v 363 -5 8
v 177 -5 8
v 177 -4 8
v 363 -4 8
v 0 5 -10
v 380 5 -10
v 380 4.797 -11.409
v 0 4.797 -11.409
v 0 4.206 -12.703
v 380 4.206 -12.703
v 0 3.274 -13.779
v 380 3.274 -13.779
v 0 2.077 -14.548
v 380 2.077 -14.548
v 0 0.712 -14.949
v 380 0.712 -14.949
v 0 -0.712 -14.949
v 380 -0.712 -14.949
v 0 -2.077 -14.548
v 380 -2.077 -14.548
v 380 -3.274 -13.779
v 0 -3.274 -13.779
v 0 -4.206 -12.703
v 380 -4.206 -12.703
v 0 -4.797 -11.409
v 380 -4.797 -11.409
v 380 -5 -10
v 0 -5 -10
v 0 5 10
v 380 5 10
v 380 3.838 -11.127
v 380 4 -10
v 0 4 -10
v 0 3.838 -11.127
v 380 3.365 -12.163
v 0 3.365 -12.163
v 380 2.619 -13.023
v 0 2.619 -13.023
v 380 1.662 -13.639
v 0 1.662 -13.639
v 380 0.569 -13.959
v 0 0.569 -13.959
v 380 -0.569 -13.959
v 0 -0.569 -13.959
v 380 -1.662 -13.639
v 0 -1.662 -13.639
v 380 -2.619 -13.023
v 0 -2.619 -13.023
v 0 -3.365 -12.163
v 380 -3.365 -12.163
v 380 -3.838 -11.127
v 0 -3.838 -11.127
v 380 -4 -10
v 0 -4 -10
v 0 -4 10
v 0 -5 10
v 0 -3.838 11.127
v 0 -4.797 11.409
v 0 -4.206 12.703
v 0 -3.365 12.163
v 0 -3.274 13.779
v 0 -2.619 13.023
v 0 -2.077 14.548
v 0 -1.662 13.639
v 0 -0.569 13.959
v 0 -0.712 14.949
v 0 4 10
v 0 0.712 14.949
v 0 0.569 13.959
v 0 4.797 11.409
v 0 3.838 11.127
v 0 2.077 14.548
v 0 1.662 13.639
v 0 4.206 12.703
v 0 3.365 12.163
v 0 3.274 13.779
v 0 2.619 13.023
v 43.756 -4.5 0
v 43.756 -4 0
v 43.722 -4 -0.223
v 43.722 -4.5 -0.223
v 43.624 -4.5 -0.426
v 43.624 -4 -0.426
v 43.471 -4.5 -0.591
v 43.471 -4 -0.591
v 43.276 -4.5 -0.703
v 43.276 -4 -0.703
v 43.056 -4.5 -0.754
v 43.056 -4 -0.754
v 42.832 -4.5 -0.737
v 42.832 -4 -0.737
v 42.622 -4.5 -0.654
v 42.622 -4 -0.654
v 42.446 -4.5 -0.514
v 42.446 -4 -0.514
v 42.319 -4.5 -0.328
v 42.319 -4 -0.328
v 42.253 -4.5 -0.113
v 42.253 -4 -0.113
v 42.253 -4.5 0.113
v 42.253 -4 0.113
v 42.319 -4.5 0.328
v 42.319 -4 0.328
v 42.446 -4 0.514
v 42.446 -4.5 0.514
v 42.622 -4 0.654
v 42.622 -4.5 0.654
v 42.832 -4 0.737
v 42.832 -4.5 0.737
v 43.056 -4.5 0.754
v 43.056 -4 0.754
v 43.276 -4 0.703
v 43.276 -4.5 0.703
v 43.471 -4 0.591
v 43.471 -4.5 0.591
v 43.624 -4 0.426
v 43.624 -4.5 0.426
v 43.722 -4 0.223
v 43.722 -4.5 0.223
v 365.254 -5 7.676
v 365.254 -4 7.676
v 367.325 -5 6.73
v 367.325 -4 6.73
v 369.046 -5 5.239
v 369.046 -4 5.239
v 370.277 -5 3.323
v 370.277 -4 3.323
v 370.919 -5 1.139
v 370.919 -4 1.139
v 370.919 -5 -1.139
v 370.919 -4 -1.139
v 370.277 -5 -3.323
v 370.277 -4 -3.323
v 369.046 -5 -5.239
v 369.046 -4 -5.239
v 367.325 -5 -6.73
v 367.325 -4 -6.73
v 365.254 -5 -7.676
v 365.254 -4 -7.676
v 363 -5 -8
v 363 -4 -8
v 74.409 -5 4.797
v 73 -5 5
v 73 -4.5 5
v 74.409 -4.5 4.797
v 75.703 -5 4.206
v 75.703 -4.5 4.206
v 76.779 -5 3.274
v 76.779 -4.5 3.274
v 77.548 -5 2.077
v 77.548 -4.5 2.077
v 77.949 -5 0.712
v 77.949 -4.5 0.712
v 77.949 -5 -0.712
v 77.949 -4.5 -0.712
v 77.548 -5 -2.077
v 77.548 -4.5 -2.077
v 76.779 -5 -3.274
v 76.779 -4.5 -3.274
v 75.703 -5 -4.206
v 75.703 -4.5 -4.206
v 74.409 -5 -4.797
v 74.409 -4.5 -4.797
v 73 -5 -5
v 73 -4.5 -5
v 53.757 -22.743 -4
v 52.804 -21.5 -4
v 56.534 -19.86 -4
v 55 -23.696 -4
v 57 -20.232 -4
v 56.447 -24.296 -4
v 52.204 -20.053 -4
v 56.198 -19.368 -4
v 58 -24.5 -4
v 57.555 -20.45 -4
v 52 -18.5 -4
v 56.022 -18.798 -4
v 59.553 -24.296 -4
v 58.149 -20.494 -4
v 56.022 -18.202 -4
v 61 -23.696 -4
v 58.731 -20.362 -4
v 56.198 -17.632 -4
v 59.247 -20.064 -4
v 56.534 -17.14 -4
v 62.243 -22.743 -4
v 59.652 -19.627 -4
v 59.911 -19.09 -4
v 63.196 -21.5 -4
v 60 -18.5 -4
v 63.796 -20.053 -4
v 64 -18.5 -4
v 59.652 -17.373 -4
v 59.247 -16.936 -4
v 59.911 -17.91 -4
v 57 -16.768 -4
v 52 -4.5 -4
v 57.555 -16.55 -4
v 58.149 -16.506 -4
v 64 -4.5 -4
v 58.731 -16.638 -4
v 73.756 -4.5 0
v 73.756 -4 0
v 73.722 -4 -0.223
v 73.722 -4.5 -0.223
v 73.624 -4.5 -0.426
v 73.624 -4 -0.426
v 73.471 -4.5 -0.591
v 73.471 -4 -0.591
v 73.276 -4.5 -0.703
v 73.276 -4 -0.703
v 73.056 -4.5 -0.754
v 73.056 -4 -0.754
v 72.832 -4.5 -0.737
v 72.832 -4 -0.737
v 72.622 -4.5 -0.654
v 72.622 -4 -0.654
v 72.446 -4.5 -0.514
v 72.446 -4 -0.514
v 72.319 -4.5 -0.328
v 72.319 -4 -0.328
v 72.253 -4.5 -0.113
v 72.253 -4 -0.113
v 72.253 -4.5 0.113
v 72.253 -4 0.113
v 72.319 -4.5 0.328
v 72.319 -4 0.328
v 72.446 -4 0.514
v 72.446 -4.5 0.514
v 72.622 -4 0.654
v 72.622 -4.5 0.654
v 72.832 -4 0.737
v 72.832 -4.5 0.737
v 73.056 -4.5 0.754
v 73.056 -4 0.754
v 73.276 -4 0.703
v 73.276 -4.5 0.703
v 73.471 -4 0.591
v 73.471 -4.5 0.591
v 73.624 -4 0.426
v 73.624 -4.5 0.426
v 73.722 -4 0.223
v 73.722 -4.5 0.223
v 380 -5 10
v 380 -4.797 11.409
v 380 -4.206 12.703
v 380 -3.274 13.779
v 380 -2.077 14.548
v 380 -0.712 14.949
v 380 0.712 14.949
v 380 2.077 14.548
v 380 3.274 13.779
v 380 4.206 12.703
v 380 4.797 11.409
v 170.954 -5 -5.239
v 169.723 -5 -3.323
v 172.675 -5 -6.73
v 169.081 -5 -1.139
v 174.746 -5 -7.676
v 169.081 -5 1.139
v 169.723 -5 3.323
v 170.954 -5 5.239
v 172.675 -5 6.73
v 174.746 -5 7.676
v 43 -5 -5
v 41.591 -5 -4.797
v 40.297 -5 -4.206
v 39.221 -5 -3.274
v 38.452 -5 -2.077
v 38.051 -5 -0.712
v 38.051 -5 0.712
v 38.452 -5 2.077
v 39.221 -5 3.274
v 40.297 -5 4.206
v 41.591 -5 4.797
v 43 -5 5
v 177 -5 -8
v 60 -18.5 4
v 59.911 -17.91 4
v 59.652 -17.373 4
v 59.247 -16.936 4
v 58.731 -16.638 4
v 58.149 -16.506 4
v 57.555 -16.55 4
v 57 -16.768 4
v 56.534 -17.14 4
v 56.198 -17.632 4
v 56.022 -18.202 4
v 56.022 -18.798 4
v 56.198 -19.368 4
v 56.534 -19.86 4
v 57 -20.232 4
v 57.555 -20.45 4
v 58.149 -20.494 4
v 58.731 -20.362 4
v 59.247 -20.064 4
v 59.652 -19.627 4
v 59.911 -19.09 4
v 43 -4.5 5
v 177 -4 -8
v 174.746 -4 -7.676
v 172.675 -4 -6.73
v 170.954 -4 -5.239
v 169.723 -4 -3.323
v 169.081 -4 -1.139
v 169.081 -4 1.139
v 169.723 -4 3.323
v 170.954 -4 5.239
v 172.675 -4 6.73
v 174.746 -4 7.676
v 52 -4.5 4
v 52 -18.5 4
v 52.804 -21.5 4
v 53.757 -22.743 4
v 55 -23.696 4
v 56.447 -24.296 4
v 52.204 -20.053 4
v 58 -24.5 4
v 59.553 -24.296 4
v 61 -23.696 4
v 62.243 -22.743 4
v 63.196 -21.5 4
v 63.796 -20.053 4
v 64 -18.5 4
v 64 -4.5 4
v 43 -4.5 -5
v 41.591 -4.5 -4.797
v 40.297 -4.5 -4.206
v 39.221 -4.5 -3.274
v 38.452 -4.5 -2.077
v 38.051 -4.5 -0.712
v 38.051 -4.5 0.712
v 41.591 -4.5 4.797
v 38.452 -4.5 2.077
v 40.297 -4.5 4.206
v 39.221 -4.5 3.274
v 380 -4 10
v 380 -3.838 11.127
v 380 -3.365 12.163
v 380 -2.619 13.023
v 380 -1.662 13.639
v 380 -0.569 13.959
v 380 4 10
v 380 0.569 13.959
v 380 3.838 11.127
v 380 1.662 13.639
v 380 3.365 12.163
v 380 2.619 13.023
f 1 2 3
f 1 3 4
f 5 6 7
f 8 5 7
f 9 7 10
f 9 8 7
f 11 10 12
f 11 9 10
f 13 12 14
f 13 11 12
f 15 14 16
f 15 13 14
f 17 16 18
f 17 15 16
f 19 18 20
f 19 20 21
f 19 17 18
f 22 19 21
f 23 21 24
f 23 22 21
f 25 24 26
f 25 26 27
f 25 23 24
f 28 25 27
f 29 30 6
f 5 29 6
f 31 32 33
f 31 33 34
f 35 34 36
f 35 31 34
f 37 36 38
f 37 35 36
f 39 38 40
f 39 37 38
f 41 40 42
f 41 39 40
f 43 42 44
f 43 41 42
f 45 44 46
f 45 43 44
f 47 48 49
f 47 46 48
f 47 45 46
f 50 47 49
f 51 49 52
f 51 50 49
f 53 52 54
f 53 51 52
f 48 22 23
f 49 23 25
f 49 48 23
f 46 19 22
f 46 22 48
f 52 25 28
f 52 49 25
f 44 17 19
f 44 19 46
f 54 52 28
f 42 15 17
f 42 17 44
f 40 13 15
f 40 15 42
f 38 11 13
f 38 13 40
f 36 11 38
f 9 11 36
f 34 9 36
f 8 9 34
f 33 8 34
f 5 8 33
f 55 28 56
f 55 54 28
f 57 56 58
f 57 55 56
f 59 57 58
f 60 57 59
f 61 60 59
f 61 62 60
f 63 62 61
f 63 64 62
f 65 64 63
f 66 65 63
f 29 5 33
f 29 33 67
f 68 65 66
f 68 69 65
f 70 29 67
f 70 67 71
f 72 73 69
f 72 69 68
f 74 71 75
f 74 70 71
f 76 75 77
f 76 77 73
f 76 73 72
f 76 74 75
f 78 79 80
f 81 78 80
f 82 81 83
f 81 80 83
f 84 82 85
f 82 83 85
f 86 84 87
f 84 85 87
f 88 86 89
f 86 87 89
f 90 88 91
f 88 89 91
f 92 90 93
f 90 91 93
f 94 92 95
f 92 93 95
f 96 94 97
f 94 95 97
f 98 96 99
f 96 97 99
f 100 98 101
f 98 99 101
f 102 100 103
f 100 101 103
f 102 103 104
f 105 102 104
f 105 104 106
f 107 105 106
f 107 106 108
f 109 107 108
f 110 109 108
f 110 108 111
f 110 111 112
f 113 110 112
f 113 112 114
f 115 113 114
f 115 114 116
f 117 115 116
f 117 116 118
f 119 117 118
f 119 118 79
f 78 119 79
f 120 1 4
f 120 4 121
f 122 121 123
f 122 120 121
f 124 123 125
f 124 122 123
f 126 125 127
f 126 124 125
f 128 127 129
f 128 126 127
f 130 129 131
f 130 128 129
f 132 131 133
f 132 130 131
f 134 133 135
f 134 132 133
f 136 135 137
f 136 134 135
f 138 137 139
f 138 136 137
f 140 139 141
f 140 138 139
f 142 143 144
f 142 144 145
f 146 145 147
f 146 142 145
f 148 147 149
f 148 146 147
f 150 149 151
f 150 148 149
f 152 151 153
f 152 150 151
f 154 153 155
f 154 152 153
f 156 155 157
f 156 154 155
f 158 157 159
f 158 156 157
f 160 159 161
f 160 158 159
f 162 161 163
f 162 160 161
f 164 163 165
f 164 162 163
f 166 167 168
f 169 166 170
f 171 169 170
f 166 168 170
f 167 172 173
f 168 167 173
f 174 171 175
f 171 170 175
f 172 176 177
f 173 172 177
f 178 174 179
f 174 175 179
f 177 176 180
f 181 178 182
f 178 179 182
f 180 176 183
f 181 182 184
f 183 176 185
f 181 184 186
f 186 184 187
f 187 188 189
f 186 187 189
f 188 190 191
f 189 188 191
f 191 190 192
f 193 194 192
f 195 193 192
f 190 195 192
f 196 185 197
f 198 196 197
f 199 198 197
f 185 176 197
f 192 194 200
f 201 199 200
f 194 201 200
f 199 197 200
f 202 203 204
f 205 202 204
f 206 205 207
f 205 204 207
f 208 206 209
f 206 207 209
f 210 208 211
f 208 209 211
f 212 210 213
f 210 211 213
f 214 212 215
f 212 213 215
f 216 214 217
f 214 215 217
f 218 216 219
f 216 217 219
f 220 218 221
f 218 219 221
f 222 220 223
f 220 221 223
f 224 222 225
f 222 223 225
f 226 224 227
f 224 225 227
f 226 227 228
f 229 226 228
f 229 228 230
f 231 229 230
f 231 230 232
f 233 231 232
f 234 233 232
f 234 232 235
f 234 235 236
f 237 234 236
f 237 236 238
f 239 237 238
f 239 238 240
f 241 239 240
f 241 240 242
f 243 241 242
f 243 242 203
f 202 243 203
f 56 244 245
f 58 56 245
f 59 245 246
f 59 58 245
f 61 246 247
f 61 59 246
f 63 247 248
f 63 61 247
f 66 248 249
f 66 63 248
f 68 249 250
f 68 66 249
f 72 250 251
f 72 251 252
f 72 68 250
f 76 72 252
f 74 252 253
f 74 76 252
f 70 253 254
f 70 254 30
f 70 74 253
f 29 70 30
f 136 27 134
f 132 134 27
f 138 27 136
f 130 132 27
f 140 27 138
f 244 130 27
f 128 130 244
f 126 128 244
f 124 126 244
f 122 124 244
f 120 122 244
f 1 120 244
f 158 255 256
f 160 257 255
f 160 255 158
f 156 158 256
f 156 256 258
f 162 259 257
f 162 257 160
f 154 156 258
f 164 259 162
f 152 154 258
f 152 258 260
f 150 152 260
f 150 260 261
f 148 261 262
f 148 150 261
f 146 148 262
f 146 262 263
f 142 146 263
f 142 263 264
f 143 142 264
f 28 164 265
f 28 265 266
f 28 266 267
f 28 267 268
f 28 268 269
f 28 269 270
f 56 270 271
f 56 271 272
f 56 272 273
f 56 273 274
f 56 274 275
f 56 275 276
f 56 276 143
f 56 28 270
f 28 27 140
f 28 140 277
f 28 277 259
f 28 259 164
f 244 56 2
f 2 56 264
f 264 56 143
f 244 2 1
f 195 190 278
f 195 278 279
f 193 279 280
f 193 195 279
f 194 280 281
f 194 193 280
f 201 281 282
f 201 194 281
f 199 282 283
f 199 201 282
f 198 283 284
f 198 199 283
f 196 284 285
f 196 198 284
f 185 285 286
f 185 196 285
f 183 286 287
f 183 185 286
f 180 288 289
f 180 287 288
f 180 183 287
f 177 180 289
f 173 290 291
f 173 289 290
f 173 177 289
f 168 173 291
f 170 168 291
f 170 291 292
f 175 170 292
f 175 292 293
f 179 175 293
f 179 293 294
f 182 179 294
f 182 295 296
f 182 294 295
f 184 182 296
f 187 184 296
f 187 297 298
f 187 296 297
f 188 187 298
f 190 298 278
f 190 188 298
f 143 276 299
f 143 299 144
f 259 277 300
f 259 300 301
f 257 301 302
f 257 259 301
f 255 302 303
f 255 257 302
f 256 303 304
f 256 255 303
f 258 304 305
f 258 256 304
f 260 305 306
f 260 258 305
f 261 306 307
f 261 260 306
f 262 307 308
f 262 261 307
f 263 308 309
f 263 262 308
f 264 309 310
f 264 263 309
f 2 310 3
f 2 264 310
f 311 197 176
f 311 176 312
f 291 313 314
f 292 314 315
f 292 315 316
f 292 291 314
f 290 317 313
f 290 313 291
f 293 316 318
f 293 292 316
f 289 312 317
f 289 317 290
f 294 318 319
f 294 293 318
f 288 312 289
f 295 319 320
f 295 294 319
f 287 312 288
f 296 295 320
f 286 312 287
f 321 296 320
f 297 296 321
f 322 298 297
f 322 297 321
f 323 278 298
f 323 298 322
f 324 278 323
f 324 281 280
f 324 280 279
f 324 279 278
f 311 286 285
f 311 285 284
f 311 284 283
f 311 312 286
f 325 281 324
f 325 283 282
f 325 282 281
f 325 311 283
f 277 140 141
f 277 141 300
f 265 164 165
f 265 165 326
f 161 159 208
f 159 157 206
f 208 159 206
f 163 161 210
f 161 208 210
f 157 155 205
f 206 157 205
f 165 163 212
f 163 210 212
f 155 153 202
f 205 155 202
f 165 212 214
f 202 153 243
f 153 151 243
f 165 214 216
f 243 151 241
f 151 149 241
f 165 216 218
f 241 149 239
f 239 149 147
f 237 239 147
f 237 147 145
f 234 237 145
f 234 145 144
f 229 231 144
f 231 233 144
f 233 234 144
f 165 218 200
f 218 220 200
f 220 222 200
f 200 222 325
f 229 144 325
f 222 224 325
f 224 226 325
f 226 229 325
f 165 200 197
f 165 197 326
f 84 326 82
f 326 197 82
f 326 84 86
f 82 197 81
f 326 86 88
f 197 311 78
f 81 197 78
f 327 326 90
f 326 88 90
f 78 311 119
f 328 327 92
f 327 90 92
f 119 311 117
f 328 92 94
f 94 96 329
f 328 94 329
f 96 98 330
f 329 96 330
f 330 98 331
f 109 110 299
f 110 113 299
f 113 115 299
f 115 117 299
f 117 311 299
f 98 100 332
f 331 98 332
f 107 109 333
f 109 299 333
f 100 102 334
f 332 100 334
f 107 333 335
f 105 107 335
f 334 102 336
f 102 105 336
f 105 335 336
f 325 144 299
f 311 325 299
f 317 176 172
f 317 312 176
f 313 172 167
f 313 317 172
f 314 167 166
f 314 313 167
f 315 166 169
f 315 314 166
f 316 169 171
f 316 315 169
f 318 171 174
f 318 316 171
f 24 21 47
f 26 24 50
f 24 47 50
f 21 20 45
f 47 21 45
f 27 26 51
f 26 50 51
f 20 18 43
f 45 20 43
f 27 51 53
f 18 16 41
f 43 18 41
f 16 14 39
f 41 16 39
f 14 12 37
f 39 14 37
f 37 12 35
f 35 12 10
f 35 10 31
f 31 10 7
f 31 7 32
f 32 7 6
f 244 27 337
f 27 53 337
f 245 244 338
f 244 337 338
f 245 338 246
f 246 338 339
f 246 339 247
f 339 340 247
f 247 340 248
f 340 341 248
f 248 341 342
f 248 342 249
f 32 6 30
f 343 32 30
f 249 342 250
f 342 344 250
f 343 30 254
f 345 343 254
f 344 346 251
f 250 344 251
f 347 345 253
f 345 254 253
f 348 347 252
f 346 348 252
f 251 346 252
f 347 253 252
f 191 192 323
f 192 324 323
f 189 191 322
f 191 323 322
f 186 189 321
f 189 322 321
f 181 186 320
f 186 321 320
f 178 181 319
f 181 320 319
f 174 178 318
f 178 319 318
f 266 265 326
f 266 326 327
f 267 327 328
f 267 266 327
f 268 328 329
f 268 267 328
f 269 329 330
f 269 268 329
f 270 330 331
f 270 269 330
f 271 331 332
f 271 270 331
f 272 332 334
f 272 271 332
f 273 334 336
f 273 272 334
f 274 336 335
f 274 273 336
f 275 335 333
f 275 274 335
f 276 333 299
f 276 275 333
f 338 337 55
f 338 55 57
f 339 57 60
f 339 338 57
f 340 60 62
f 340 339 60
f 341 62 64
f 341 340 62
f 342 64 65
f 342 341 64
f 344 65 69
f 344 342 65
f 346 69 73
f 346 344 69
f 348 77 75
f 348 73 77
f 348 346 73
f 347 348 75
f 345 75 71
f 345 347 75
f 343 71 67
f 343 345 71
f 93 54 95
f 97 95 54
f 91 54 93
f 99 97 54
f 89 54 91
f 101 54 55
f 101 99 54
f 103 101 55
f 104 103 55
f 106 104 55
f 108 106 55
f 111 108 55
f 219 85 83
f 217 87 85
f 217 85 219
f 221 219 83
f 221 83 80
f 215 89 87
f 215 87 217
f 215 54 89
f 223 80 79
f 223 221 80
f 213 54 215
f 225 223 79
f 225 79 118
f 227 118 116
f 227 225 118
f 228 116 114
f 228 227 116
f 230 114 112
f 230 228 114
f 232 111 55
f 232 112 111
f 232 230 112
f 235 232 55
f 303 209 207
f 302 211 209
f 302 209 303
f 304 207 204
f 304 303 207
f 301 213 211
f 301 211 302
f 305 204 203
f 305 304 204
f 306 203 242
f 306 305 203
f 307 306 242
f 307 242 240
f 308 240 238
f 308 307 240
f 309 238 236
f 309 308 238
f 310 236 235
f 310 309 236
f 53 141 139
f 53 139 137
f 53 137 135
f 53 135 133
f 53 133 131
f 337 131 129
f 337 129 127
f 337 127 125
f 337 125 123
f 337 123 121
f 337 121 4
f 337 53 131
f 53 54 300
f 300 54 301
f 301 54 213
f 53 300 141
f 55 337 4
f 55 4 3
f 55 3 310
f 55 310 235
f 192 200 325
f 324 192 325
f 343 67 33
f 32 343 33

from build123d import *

# Parameters (mm, degrees)
EXTRUDE_1_DEPTH          = 380
CUT_EXTRUDE_1_DEPTH      = 0.5
SKETCH_3_W               = 12
SKETCH_3_H               = 8
EXTRUDE_2_DEPTH          = 20
FILLET_1_R               = 6
CUT_EXTRUDE_2_DEPTH      = 382.084308257
CUT_EXTRUDE_2_DEPTH_BACK = 382.084308257
CUT_EXTRUDE_3_DEPTH      = 9
CUT_EXTRUDE_4_DEPTH      = 382.262704706
CUT_EXTRUDE_4_DEPTH_BACK = 382.262704706
SKETCH_6_R               = 2
HOLE_WIZARD_1_64_1_D     = 1.5113
HOLE_WIZARD_1_64_1_DEPTH = 5.69
HOLE_WIZARD_1_64_1_TIP   = 0.454040327


with BuildPart() as part:
    # 草图1 → 凸台-拉伸1 (new body)
    with BuildSketch(Plane(origin=(0, 0, 0), x_dir=(0, 0, -1), z_dir=(1, 0, 0))):
        with BuildLine():
            Line((10, -5), (-10, -5))
            ThreePointArc((-10, -5), (-15, 0), (-10, 5))
            Line((-10, 5), (10, 5))
            ThreePointArc((10, 5), (15, 0), (10, -5))
        make_face()
    extrude(amount=EXTRUDE_1_DEPTH)

    # 草图2 → 切除-拉伸1 (cut)
    with BuildSketch(Plane.XZ.offset(5)):
        with BuildLine():
            Line((73, -5), (43, -5))
            ThreePointArc((43, -5), (38, 0), (43, 5))
            Line((43, 5), (73, 5))
            ThreePointArc((73, 5), (78, 0), (73, -5))
        make_face()
    extrude(amount=-CUT_EXTRUDE_1_DEPTH, mode=Mode.SUBTRACT)

    # 草图3 → 凸台-拉伸2 (add)
    with BuildSketch(Plane.XZ.offset(4.5)):
        with Locations((58, 0)):
            Rectangle(SKETCH_3_W, SKETCH_3_H)
    extrude(amount=EXTRUDE_2_DEPTH)

    # 圆角1
    fillet_1_edges = [part.edges().sort_by_distance(p)[0] for p in [
        (64, -24.5, 0),
        (52, -24.5, 0),
    ]]
    fillet(fillet_1_edges, radius=FILLET_1_R - 0.0001)  # a hair under: the kernel refuses the full size

    # 草图4 → 切除-拉伸2 (cut, two sides: drawn at the far end of the back side and taken through both)
    with BuildSketch(Plane.ZY.offset(-CUT_EXTRUDE_2_DEPTH_BACK)):
        with BuildLine():
            Line((-10, -4), (10, -4))
            ThreePointArc((10, -4), (14, 0), (10, 4))
            Line((10, 4), (-10, 4))
            ThreePointArc((-10, 4), (-14, 0), (-10, -4))
        make_face()
    extrude(amount=CUT_EXTRUDE_2_DEPTH + CUT_EXTRUDE_2_DEPTH_BACK, mode=Mode.SUBTRACT)

    # 草图5 → 切除-拉伸3 (cut)
    with BuildSketch(Plane.XZ.offset(5)):
        with BuildLine():
            Line((363, -8), (177, -8))
            ThreePointArc((177, -8), (169, 0), (177, 8))
            Line((177, 8), (363, 8))
            ThreePointArc((363, 8), (371, 0), (363, -8))
        make_face()
    extrude(amount=-CUT_EXTRUDE_3_DEPTH, mode=Mode.SUBTRACT)

    # 草图6 → 切除-拉伸4 (cut, two sides: drawn at the far end of the back side and taken through both)
    with BuildSketch(Plane.XY.offset(4).offset(-CUT_EXTRUDE_4_DEPTH_BACK)):
        with Locations((58, -18.5)):
            Circle(SKETCH_6_R)
    extrude(amount=CUT_EXTRUDE_4_DEPTH + CUT_EXTRUDE_4_DEPTH_BACK, mode=Mode.SUBTRACT)

    # #1-64 螺纹孔1
    with Locations(Plane(origin=(0, -4.5, 0), x_dir=(-1, 0, 0), z_dir=(0, -1, 0))):
        with Locations((-43, 0), (-73, 0)):
            Hole(HOLE_WIZARD_1_64_1_D / 2, depth=HOLE_WIZARD_1_64_1_DEPTH)
            with Locations((0, 0, -(HOLE_WIZARD_1_64_1_DEPTH + HOLE_WIZARD_1_64_1_TIP / 2))):  # 118° drill point
                Cone(0, HOLE_WIZARD_1_64_1_D / 2, HOLE_WIZARD_1_64_1_TIP, mode=Mode.SUBTRACT)


solid = part.part
